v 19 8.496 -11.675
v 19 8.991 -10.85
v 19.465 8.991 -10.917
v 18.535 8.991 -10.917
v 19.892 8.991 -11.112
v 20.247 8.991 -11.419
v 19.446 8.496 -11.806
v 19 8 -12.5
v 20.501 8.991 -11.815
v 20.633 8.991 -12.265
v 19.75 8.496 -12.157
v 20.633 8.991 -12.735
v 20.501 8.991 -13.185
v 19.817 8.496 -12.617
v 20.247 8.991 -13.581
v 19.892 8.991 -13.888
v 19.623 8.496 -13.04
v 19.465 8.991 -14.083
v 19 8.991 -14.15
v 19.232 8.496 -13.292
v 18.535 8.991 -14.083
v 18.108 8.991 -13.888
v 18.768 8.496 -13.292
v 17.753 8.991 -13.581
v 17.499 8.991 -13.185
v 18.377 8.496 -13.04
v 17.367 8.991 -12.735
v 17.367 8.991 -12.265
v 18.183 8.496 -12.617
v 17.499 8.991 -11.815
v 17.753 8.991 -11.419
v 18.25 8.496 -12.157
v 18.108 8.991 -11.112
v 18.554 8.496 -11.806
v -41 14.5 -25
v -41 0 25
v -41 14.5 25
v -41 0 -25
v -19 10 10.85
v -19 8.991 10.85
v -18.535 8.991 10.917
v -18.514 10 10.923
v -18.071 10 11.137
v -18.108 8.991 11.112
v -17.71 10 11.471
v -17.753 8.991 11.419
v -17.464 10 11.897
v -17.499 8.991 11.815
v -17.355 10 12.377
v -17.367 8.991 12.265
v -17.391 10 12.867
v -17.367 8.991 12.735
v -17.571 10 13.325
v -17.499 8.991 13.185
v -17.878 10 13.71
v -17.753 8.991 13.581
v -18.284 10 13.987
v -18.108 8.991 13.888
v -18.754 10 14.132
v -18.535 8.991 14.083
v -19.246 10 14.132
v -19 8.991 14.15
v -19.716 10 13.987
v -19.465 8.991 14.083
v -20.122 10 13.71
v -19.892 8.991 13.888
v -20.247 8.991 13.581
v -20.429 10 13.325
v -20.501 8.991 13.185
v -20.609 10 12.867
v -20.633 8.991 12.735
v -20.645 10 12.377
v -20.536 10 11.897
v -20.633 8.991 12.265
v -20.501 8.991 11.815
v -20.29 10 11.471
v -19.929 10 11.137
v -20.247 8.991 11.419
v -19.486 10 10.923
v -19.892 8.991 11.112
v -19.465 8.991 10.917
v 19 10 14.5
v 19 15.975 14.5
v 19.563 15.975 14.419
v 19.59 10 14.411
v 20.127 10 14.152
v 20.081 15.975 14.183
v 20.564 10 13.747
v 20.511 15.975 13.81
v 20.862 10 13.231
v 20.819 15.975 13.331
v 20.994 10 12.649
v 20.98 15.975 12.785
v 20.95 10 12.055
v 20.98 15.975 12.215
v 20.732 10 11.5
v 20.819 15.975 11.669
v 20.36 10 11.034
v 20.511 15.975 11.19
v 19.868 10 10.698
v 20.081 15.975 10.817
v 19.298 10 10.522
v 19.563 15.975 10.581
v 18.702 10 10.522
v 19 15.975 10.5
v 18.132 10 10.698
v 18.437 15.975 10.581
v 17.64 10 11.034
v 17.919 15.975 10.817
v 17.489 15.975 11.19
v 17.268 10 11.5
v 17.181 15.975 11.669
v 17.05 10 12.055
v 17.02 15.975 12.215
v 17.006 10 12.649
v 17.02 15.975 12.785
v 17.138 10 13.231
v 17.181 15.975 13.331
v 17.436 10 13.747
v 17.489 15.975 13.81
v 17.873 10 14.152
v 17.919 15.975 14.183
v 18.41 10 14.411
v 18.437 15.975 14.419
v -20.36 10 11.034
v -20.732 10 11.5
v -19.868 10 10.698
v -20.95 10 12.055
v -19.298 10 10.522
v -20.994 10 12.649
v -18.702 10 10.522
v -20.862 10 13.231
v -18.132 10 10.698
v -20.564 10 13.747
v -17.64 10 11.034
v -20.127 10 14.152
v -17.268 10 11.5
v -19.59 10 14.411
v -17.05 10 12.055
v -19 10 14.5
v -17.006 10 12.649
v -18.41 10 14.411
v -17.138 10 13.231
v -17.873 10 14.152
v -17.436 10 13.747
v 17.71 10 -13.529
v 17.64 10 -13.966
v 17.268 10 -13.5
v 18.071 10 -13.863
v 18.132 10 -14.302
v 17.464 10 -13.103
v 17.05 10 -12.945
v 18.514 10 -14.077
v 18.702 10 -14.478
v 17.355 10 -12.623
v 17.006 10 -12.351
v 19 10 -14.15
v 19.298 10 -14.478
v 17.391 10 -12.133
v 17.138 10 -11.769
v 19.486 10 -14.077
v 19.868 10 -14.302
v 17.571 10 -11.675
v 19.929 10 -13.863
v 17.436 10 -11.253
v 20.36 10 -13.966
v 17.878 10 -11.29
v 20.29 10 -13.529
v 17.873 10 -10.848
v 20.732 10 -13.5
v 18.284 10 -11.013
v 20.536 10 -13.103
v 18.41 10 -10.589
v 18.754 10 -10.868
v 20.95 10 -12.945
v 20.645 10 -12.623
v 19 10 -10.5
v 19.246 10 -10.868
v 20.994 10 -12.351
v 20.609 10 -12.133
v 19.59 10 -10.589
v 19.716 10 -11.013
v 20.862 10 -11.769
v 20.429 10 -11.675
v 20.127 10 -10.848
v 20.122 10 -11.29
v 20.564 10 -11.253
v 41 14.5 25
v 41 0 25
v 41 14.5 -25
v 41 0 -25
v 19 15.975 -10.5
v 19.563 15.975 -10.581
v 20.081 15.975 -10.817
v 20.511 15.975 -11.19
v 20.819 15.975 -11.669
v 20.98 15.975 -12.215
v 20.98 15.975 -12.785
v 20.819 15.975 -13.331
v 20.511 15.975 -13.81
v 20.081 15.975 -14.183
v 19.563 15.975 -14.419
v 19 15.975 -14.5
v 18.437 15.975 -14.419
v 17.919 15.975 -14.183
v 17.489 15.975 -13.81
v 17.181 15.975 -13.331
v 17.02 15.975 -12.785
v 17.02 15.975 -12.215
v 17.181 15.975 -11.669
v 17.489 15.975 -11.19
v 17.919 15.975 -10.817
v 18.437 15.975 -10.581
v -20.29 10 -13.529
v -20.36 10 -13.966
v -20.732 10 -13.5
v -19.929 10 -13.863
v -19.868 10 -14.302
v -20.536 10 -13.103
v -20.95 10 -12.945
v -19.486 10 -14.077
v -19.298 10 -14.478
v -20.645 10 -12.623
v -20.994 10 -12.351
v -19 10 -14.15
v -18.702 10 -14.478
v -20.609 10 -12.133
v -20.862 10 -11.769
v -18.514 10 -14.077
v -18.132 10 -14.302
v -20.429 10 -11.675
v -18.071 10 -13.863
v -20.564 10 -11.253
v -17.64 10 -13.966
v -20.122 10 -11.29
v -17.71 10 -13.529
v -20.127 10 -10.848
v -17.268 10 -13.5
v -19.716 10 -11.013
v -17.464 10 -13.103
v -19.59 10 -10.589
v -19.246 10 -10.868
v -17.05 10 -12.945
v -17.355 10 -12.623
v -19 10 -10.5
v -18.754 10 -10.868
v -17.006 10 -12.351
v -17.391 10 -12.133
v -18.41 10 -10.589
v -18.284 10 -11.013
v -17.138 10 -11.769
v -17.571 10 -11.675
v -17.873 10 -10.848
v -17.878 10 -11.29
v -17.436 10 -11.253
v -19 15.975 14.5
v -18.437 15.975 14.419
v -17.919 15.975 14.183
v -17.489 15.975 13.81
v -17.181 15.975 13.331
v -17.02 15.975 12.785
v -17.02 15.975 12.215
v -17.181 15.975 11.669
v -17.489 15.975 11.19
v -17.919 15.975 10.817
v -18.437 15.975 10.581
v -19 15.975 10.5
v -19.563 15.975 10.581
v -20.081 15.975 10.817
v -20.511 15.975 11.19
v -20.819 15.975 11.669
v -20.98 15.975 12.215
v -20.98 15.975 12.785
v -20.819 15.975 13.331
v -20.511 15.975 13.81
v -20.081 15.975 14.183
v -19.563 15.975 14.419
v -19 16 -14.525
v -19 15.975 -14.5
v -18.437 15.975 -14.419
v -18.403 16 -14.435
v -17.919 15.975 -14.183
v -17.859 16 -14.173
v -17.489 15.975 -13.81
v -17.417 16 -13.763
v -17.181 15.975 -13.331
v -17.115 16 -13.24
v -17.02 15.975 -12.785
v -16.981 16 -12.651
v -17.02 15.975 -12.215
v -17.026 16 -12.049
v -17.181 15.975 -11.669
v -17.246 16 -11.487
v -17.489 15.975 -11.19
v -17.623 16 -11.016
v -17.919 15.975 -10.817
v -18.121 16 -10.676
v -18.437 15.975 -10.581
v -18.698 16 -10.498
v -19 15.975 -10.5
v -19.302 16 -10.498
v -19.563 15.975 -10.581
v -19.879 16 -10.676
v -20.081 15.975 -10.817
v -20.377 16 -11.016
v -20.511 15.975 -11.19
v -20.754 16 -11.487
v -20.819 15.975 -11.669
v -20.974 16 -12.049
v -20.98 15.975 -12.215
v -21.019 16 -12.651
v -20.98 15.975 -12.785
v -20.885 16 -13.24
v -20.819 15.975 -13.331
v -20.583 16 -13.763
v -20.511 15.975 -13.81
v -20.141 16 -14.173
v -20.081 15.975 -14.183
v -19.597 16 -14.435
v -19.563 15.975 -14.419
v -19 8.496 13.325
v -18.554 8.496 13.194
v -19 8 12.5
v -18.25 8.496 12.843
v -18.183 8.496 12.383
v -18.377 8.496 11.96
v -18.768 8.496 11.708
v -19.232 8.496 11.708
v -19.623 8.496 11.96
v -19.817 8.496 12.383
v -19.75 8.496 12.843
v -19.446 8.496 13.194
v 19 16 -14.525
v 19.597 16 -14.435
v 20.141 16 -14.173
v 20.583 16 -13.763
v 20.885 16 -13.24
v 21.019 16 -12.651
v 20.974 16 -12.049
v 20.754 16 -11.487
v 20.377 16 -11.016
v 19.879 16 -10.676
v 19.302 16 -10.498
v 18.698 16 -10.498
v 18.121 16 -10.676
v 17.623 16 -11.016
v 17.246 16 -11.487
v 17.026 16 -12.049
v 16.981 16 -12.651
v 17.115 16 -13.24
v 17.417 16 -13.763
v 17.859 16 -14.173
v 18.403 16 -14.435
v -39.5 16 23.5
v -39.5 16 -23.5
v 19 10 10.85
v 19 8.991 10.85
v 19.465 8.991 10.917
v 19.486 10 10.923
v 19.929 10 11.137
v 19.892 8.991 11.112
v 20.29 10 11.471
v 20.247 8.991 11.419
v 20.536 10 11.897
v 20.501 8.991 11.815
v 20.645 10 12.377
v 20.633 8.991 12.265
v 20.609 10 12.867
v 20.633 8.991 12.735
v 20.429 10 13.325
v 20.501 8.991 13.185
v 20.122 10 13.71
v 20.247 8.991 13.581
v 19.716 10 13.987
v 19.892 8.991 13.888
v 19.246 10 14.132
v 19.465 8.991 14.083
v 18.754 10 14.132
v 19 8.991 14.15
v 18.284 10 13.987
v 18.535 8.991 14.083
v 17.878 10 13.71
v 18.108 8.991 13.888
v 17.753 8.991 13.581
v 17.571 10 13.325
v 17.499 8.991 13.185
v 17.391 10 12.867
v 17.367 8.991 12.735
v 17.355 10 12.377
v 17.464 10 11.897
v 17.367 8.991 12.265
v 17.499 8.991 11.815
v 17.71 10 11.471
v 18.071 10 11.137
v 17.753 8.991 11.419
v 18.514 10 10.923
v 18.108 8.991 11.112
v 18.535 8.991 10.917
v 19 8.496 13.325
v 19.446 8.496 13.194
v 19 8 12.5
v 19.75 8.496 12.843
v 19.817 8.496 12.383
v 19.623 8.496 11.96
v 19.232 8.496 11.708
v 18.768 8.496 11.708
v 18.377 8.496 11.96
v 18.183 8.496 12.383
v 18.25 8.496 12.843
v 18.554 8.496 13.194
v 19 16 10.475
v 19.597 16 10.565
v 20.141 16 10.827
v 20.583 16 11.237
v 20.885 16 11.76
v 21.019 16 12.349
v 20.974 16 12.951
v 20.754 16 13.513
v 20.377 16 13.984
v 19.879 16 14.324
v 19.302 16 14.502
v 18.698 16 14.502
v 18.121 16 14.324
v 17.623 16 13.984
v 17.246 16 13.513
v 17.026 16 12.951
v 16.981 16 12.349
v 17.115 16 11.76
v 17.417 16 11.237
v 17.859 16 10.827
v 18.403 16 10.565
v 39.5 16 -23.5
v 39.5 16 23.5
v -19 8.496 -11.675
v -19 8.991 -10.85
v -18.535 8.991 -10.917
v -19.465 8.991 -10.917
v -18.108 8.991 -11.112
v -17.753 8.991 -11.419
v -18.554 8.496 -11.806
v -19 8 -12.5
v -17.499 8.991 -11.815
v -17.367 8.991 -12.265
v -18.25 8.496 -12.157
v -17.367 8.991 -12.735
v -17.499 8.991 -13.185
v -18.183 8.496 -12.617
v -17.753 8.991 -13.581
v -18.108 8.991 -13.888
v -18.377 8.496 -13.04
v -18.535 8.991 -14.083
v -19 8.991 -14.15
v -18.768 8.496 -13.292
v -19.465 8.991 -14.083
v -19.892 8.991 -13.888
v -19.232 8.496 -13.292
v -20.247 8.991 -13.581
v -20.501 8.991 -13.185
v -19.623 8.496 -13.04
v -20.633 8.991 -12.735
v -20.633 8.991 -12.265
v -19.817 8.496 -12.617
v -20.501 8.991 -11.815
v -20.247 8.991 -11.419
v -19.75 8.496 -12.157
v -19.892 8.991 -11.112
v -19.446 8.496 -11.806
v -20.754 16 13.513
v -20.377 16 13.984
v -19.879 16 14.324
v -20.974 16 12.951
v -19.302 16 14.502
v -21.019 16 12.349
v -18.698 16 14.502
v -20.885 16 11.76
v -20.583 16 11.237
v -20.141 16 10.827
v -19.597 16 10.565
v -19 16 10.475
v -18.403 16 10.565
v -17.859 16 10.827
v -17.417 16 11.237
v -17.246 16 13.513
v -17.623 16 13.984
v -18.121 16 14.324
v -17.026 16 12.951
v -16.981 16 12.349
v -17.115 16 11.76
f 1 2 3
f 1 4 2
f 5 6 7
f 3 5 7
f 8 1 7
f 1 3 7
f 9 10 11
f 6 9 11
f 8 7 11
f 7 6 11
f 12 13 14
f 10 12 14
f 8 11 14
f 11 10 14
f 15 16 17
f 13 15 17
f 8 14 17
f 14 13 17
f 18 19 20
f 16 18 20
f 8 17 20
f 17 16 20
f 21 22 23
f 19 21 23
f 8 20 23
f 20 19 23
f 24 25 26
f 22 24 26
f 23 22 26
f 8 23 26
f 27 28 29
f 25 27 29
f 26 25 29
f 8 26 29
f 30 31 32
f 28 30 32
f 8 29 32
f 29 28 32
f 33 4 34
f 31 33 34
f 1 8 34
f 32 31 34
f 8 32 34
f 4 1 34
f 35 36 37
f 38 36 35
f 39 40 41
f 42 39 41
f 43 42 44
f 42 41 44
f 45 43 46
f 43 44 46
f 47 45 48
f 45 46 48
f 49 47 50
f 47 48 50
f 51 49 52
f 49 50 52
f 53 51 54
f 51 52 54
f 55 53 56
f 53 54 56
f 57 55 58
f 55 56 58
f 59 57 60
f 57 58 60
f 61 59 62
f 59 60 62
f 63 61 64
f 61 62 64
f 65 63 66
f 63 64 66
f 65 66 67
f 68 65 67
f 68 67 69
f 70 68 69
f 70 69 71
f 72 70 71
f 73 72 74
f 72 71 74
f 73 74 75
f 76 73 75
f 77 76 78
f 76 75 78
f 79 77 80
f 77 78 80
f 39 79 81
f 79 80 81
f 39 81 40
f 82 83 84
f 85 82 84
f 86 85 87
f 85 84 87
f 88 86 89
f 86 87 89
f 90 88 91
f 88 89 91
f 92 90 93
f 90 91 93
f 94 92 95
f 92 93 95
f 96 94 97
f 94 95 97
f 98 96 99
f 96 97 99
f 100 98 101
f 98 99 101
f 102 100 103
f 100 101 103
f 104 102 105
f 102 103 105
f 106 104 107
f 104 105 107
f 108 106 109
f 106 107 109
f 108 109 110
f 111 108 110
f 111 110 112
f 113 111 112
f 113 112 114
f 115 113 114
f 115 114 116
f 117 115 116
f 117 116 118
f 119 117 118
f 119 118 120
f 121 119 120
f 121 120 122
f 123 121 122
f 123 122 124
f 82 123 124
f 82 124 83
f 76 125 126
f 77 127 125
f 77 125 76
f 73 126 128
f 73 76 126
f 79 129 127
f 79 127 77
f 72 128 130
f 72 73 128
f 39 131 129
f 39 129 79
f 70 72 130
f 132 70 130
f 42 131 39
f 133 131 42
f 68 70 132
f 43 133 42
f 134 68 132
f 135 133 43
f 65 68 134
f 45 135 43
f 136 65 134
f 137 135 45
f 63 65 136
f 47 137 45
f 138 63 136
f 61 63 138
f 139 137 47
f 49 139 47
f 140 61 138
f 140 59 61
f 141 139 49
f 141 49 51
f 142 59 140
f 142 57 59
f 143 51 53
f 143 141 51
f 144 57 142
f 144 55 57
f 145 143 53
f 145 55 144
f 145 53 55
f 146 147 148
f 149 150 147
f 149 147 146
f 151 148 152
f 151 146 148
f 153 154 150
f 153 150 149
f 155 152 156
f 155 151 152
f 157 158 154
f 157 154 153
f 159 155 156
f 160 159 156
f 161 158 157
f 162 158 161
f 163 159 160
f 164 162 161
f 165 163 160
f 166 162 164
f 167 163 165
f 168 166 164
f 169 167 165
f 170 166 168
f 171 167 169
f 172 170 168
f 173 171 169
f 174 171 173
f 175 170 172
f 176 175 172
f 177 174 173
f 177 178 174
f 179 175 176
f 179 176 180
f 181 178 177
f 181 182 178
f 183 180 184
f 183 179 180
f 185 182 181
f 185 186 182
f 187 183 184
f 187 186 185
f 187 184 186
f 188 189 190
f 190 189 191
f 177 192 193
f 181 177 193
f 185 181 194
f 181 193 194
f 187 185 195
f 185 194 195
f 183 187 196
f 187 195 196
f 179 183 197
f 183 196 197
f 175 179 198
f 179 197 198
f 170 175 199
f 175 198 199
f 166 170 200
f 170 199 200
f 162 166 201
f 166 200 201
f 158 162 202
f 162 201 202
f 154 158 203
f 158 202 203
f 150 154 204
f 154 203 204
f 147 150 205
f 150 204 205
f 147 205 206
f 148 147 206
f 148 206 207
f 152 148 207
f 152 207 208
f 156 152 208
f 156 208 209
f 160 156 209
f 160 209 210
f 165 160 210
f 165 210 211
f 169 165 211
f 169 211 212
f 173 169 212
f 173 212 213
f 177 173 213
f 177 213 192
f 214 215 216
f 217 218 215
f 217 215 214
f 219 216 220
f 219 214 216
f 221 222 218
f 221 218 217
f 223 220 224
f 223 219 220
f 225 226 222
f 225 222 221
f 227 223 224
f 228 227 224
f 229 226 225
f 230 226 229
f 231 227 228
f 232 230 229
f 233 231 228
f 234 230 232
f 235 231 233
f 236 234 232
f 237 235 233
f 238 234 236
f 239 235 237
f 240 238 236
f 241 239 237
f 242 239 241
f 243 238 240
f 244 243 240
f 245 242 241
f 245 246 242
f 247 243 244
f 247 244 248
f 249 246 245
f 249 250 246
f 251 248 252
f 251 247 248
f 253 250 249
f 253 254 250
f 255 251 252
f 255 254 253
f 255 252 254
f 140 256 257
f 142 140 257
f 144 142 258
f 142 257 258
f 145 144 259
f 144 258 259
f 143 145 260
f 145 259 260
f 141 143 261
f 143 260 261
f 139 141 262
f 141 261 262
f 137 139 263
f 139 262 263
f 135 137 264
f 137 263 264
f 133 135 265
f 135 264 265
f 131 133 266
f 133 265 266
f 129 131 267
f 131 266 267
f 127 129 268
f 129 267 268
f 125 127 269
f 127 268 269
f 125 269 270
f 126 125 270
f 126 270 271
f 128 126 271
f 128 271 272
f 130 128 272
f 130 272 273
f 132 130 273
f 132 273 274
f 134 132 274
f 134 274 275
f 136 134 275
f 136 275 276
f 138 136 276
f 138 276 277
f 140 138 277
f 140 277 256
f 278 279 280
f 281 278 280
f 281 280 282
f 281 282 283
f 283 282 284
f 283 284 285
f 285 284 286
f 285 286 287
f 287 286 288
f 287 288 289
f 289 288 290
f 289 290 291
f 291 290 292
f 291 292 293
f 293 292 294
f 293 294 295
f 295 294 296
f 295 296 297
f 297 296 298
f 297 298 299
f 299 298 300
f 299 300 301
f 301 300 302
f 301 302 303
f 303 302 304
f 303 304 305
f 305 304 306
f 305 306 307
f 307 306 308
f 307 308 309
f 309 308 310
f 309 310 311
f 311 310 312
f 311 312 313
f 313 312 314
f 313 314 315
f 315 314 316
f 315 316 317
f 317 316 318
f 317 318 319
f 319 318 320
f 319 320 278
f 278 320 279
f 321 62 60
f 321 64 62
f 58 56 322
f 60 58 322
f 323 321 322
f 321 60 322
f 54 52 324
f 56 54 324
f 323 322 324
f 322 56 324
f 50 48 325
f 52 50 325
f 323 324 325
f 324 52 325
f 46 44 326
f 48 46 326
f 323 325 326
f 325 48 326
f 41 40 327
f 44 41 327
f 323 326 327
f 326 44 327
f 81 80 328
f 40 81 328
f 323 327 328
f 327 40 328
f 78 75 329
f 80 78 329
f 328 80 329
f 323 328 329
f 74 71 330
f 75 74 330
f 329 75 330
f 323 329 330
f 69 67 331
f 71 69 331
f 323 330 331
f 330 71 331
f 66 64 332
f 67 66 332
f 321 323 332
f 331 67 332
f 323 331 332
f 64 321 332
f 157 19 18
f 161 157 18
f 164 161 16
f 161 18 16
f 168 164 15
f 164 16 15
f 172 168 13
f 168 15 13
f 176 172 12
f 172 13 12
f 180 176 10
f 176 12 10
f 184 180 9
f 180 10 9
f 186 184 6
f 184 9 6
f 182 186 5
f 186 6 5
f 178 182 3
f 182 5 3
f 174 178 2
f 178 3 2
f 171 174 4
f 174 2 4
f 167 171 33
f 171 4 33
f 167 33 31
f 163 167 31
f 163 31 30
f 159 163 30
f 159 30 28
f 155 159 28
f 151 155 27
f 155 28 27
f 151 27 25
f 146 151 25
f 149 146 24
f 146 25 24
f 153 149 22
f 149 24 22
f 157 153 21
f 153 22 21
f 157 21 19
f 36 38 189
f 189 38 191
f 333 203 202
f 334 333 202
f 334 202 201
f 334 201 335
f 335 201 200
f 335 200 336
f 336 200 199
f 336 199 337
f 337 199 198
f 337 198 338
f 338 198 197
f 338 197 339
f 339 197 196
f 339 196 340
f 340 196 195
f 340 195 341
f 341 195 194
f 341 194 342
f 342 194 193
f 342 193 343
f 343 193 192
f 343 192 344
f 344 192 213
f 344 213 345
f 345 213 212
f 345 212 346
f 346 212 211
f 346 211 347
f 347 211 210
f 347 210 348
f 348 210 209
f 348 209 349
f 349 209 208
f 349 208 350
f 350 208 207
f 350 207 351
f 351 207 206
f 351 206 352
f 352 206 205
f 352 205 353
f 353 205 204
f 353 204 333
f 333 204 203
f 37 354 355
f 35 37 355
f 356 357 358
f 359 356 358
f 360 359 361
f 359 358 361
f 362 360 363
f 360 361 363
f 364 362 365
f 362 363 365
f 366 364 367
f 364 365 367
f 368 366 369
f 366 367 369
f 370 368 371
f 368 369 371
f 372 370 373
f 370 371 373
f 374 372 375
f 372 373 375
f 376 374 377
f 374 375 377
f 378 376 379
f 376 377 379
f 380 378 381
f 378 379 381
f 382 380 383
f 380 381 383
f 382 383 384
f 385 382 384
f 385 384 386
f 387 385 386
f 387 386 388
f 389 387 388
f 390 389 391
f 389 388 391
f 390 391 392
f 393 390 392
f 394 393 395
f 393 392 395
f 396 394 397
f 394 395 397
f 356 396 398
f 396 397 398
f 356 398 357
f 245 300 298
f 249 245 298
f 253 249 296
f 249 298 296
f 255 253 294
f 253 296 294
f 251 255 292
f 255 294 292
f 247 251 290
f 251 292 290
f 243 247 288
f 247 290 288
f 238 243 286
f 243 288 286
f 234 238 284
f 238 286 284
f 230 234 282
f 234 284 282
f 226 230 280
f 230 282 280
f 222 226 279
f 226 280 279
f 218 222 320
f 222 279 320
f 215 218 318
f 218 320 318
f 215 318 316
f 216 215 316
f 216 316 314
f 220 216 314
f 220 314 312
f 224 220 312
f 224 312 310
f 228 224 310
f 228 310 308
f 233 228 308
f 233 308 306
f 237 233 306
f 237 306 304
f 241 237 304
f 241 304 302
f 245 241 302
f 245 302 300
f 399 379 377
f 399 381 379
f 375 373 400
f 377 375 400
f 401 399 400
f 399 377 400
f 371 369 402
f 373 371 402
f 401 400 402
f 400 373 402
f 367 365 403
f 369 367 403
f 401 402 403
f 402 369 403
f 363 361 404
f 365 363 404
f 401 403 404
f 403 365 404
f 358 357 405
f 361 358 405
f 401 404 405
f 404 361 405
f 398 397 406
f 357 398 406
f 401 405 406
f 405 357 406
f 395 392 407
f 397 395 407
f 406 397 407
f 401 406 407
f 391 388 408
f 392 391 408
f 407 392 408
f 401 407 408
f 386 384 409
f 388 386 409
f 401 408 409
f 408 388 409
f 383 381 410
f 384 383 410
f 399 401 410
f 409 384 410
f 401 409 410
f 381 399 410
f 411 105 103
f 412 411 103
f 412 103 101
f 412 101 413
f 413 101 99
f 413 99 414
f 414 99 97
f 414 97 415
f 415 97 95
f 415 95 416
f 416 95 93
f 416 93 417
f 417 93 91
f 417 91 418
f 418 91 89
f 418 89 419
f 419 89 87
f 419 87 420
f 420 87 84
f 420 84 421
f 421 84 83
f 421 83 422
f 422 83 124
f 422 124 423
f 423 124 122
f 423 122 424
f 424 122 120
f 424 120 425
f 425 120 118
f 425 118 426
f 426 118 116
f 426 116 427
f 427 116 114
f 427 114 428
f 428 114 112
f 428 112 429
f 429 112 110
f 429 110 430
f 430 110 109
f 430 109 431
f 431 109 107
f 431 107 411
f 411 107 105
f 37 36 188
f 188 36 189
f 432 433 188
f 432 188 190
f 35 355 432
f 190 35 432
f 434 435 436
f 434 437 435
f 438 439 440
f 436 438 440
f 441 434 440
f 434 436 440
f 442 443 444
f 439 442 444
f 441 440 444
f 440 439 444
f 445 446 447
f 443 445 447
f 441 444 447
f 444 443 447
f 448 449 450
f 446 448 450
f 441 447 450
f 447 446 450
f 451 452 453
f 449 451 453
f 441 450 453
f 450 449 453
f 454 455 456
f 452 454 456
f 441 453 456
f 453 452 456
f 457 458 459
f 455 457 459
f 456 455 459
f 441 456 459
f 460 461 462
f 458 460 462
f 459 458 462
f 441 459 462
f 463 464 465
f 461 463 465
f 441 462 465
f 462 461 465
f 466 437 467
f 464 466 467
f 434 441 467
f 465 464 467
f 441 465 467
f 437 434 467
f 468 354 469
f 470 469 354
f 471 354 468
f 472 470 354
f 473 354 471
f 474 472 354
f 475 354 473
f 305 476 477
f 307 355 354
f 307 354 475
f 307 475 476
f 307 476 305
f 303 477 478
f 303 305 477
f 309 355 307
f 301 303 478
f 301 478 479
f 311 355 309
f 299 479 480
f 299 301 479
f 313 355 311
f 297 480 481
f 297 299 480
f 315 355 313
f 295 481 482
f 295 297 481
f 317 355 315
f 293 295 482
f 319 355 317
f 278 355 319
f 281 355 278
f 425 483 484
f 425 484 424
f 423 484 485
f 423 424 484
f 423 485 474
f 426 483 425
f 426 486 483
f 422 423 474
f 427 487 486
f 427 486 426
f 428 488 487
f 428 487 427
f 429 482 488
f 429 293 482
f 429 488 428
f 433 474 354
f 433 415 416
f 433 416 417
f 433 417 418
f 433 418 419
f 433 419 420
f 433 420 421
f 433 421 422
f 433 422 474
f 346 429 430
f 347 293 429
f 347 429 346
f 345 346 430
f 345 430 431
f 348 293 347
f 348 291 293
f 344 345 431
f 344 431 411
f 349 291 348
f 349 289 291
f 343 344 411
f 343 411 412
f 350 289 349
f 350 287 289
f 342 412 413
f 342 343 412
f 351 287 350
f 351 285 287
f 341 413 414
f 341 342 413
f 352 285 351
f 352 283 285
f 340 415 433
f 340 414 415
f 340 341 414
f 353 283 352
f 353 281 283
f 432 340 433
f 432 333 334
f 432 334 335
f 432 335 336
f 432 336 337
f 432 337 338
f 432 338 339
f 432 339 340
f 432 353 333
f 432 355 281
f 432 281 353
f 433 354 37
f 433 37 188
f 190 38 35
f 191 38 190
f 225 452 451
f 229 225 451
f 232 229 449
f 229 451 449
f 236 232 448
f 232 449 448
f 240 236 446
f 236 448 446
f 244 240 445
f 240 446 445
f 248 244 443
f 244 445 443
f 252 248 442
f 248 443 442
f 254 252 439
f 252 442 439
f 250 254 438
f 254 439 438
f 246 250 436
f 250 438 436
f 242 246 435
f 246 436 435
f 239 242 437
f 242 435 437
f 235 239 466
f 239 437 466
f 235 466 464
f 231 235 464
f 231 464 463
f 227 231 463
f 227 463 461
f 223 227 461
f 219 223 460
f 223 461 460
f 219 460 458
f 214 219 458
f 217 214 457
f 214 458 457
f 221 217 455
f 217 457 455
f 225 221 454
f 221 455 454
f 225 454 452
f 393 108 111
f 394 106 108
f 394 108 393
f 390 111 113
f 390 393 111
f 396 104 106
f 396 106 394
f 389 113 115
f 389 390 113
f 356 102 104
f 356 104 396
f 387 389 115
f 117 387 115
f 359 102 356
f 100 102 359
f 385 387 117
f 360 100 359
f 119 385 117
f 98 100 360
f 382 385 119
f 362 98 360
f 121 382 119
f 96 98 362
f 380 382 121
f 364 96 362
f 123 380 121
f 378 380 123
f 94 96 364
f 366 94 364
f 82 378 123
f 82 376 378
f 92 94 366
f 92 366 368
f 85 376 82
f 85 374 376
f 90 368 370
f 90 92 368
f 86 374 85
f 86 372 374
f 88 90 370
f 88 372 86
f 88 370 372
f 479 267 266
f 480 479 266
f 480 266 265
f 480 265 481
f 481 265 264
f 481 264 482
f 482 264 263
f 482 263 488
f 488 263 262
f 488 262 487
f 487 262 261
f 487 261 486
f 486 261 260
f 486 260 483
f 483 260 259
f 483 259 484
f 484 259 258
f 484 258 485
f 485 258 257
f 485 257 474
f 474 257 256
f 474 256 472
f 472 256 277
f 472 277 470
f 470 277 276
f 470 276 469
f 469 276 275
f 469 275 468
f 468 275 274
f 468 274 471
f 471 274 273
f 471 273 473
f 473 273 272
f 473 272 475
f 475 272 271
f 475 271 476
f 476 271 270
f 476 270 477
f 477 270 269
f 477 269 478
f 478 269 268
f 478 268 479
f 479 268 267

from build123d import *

# Parameters (mm, degrees)
SKETCH1_W                       = 82
SKETCH1_H                       = 50
SKETCH1_R                       = 2
BOSS_EXTRUDE1_DEPTH             = 16
SKETCH2_R                       = 2
CUT_EXTRUDE1_DEPTH              = 6
M4X0_7_TAPPED_HOLE1_D           = 3.3
M4X0_7_TAPPED_HOLE1_DEPTH       = 7.008579979
M4X0_7_TAPPED_HOLE1_CSINK_D     = 4.05
M4X0_7_TAPPED_HOLE1_CSINK_ANGLE = 90
M4X0_7_TAPPED_HOLE1_TIP         = 0.991420021
CHAMFER1_SIZE                   = 1.5


with BuildPart() as part:
    # Sketch1 → Boss-Extrude1 (new body)
    # profile 1 of 5: a face of its own
    with BuildSketch(Plane(origin=(0, 0, 0), x_dir=(1, 0, 0), z_dir=(0, 1, 0))):
        Rectangle(SKETCH1_W, SKETCH1_H)
        with Locations((19, -12.5)):
            Circle(SKETCH1_R, mode=Mode.SUBTRACT)
        with Locations((-19, -12.5)):
            Circle(SKETCH1_R, mode=Mode.SUBTRACT)
        with Locations((-19, 12.5)):
            Circle(SKETCH1_R, mode=Mode.SUBTRACT)
        with Locations((19, 12.5)):
            Circle(SKETCH1_R, mode=Mode.SUBTRACT)
    # profile 2 of 5: a face of its own
    with BuildSketch(Plane(origin=(0, 0, 0), x_dir=(1, 0, 0), z_dir=(0, 1, 0))):
        with Locations((-19, 12.5)):
            Circle(SKETCH1_R)
    # profile 3 of 5: a face of its own
    with BuildSketch(Plane(origin=(0, 0, 0), x_dir=(1, 0, 0), z_dir=(0, 1, 0))):
        with Locations((19, -12.5)):
            Circle(SKETCH1_R)
    # profile 4 of 5: a face of its own
    with BuildSketch(Plane(origin=(0, 0, 0), x_dir=(1, 0, 0), z_dir=(0, 1, 0))):
        with Locations((19, 12.5)):
            Circle(SKETCH1_R)
    # profile 5 of 5: a face of its own
    with BuildSketch(Plane(origin=(0, 0, 0), x_dir=(1, 0, 0), z_dir=(0, 1, 0))):
        with Locations((-19, -12.5)):
            Circle(SKETCH1_R)
    extrude(amount=BOSS_EXTRUDE1_DEPTH)

    # Sketch2 → Cut-Extrude1 (cut)
    with BuildSketch(Plane(origin=(0, 16, 0), x_dir=(1, 0, 0), z_dir=(0, 1, 0))):
        with Locations(Location((-19, -12.5, 0), (0, 0, 270))):
            Circle(SKETCH2_R)
        with Locations(Location((-19, 12.5, 0), (0, 0, 270))):
            Circle(SKETCH2_R)
        with Locations(Location((19, -12.5, 0), (0, 0, 270))):
            Circle(SKETCH2_R)
        with Locations(Location((19, 12.5, 0), (0, 0, 270))):
            Circle(SKETCH2_R)
    extrude(amount=-CUT_EXTRUDE1_DEPTH, mode=Mode.SUBTRACT)

    # M4x0.7 Tapped Hole1
    with Locations(Plane(origin=(-19, 16, -12.5), x_dir=(0, 0, 1), z_dir=(0, 1, 0))):
        with Locations((0, 0), (0, 38), (25, 38), (25, 0)):
            CounterSinkHole(M4X0_7_TAPPED_HOLE1_D / 2, M4X0_7_TAPPED_HOLE1_CSINK_D / 2, depth=M4X0_7_TAPPED_HOLE1_DEPTH, counter_sink_angle=M4X0_7_TAPPED_HOLE1_CSINK_ANGLE)
            with Locations((0, 0, -(M4X0_7_TAPPED_HOLE1_DEPTH + M4X0_7_TAPPED_HOLE1_TIP / 2))):  # 118° drill point
                Cone(0, M4X0_7_TAPPED_HOLE1_D / 2, M4X0_7_TAPPED_HOLE1_TIP, mode=Mode.SUBTRACT)

    # Chamfer1
    chamfer1_edges = [part.edges().sort_by_distance(p)[0] for p in [
        (0, 16, 25),
        (41, 16, 0),
        (0, 16, -25),
        (-41, 16, 0),
    ]]
    chamfer(chamfer1_edges, length=CHAMFER1_SIZE)


solid = part.part
